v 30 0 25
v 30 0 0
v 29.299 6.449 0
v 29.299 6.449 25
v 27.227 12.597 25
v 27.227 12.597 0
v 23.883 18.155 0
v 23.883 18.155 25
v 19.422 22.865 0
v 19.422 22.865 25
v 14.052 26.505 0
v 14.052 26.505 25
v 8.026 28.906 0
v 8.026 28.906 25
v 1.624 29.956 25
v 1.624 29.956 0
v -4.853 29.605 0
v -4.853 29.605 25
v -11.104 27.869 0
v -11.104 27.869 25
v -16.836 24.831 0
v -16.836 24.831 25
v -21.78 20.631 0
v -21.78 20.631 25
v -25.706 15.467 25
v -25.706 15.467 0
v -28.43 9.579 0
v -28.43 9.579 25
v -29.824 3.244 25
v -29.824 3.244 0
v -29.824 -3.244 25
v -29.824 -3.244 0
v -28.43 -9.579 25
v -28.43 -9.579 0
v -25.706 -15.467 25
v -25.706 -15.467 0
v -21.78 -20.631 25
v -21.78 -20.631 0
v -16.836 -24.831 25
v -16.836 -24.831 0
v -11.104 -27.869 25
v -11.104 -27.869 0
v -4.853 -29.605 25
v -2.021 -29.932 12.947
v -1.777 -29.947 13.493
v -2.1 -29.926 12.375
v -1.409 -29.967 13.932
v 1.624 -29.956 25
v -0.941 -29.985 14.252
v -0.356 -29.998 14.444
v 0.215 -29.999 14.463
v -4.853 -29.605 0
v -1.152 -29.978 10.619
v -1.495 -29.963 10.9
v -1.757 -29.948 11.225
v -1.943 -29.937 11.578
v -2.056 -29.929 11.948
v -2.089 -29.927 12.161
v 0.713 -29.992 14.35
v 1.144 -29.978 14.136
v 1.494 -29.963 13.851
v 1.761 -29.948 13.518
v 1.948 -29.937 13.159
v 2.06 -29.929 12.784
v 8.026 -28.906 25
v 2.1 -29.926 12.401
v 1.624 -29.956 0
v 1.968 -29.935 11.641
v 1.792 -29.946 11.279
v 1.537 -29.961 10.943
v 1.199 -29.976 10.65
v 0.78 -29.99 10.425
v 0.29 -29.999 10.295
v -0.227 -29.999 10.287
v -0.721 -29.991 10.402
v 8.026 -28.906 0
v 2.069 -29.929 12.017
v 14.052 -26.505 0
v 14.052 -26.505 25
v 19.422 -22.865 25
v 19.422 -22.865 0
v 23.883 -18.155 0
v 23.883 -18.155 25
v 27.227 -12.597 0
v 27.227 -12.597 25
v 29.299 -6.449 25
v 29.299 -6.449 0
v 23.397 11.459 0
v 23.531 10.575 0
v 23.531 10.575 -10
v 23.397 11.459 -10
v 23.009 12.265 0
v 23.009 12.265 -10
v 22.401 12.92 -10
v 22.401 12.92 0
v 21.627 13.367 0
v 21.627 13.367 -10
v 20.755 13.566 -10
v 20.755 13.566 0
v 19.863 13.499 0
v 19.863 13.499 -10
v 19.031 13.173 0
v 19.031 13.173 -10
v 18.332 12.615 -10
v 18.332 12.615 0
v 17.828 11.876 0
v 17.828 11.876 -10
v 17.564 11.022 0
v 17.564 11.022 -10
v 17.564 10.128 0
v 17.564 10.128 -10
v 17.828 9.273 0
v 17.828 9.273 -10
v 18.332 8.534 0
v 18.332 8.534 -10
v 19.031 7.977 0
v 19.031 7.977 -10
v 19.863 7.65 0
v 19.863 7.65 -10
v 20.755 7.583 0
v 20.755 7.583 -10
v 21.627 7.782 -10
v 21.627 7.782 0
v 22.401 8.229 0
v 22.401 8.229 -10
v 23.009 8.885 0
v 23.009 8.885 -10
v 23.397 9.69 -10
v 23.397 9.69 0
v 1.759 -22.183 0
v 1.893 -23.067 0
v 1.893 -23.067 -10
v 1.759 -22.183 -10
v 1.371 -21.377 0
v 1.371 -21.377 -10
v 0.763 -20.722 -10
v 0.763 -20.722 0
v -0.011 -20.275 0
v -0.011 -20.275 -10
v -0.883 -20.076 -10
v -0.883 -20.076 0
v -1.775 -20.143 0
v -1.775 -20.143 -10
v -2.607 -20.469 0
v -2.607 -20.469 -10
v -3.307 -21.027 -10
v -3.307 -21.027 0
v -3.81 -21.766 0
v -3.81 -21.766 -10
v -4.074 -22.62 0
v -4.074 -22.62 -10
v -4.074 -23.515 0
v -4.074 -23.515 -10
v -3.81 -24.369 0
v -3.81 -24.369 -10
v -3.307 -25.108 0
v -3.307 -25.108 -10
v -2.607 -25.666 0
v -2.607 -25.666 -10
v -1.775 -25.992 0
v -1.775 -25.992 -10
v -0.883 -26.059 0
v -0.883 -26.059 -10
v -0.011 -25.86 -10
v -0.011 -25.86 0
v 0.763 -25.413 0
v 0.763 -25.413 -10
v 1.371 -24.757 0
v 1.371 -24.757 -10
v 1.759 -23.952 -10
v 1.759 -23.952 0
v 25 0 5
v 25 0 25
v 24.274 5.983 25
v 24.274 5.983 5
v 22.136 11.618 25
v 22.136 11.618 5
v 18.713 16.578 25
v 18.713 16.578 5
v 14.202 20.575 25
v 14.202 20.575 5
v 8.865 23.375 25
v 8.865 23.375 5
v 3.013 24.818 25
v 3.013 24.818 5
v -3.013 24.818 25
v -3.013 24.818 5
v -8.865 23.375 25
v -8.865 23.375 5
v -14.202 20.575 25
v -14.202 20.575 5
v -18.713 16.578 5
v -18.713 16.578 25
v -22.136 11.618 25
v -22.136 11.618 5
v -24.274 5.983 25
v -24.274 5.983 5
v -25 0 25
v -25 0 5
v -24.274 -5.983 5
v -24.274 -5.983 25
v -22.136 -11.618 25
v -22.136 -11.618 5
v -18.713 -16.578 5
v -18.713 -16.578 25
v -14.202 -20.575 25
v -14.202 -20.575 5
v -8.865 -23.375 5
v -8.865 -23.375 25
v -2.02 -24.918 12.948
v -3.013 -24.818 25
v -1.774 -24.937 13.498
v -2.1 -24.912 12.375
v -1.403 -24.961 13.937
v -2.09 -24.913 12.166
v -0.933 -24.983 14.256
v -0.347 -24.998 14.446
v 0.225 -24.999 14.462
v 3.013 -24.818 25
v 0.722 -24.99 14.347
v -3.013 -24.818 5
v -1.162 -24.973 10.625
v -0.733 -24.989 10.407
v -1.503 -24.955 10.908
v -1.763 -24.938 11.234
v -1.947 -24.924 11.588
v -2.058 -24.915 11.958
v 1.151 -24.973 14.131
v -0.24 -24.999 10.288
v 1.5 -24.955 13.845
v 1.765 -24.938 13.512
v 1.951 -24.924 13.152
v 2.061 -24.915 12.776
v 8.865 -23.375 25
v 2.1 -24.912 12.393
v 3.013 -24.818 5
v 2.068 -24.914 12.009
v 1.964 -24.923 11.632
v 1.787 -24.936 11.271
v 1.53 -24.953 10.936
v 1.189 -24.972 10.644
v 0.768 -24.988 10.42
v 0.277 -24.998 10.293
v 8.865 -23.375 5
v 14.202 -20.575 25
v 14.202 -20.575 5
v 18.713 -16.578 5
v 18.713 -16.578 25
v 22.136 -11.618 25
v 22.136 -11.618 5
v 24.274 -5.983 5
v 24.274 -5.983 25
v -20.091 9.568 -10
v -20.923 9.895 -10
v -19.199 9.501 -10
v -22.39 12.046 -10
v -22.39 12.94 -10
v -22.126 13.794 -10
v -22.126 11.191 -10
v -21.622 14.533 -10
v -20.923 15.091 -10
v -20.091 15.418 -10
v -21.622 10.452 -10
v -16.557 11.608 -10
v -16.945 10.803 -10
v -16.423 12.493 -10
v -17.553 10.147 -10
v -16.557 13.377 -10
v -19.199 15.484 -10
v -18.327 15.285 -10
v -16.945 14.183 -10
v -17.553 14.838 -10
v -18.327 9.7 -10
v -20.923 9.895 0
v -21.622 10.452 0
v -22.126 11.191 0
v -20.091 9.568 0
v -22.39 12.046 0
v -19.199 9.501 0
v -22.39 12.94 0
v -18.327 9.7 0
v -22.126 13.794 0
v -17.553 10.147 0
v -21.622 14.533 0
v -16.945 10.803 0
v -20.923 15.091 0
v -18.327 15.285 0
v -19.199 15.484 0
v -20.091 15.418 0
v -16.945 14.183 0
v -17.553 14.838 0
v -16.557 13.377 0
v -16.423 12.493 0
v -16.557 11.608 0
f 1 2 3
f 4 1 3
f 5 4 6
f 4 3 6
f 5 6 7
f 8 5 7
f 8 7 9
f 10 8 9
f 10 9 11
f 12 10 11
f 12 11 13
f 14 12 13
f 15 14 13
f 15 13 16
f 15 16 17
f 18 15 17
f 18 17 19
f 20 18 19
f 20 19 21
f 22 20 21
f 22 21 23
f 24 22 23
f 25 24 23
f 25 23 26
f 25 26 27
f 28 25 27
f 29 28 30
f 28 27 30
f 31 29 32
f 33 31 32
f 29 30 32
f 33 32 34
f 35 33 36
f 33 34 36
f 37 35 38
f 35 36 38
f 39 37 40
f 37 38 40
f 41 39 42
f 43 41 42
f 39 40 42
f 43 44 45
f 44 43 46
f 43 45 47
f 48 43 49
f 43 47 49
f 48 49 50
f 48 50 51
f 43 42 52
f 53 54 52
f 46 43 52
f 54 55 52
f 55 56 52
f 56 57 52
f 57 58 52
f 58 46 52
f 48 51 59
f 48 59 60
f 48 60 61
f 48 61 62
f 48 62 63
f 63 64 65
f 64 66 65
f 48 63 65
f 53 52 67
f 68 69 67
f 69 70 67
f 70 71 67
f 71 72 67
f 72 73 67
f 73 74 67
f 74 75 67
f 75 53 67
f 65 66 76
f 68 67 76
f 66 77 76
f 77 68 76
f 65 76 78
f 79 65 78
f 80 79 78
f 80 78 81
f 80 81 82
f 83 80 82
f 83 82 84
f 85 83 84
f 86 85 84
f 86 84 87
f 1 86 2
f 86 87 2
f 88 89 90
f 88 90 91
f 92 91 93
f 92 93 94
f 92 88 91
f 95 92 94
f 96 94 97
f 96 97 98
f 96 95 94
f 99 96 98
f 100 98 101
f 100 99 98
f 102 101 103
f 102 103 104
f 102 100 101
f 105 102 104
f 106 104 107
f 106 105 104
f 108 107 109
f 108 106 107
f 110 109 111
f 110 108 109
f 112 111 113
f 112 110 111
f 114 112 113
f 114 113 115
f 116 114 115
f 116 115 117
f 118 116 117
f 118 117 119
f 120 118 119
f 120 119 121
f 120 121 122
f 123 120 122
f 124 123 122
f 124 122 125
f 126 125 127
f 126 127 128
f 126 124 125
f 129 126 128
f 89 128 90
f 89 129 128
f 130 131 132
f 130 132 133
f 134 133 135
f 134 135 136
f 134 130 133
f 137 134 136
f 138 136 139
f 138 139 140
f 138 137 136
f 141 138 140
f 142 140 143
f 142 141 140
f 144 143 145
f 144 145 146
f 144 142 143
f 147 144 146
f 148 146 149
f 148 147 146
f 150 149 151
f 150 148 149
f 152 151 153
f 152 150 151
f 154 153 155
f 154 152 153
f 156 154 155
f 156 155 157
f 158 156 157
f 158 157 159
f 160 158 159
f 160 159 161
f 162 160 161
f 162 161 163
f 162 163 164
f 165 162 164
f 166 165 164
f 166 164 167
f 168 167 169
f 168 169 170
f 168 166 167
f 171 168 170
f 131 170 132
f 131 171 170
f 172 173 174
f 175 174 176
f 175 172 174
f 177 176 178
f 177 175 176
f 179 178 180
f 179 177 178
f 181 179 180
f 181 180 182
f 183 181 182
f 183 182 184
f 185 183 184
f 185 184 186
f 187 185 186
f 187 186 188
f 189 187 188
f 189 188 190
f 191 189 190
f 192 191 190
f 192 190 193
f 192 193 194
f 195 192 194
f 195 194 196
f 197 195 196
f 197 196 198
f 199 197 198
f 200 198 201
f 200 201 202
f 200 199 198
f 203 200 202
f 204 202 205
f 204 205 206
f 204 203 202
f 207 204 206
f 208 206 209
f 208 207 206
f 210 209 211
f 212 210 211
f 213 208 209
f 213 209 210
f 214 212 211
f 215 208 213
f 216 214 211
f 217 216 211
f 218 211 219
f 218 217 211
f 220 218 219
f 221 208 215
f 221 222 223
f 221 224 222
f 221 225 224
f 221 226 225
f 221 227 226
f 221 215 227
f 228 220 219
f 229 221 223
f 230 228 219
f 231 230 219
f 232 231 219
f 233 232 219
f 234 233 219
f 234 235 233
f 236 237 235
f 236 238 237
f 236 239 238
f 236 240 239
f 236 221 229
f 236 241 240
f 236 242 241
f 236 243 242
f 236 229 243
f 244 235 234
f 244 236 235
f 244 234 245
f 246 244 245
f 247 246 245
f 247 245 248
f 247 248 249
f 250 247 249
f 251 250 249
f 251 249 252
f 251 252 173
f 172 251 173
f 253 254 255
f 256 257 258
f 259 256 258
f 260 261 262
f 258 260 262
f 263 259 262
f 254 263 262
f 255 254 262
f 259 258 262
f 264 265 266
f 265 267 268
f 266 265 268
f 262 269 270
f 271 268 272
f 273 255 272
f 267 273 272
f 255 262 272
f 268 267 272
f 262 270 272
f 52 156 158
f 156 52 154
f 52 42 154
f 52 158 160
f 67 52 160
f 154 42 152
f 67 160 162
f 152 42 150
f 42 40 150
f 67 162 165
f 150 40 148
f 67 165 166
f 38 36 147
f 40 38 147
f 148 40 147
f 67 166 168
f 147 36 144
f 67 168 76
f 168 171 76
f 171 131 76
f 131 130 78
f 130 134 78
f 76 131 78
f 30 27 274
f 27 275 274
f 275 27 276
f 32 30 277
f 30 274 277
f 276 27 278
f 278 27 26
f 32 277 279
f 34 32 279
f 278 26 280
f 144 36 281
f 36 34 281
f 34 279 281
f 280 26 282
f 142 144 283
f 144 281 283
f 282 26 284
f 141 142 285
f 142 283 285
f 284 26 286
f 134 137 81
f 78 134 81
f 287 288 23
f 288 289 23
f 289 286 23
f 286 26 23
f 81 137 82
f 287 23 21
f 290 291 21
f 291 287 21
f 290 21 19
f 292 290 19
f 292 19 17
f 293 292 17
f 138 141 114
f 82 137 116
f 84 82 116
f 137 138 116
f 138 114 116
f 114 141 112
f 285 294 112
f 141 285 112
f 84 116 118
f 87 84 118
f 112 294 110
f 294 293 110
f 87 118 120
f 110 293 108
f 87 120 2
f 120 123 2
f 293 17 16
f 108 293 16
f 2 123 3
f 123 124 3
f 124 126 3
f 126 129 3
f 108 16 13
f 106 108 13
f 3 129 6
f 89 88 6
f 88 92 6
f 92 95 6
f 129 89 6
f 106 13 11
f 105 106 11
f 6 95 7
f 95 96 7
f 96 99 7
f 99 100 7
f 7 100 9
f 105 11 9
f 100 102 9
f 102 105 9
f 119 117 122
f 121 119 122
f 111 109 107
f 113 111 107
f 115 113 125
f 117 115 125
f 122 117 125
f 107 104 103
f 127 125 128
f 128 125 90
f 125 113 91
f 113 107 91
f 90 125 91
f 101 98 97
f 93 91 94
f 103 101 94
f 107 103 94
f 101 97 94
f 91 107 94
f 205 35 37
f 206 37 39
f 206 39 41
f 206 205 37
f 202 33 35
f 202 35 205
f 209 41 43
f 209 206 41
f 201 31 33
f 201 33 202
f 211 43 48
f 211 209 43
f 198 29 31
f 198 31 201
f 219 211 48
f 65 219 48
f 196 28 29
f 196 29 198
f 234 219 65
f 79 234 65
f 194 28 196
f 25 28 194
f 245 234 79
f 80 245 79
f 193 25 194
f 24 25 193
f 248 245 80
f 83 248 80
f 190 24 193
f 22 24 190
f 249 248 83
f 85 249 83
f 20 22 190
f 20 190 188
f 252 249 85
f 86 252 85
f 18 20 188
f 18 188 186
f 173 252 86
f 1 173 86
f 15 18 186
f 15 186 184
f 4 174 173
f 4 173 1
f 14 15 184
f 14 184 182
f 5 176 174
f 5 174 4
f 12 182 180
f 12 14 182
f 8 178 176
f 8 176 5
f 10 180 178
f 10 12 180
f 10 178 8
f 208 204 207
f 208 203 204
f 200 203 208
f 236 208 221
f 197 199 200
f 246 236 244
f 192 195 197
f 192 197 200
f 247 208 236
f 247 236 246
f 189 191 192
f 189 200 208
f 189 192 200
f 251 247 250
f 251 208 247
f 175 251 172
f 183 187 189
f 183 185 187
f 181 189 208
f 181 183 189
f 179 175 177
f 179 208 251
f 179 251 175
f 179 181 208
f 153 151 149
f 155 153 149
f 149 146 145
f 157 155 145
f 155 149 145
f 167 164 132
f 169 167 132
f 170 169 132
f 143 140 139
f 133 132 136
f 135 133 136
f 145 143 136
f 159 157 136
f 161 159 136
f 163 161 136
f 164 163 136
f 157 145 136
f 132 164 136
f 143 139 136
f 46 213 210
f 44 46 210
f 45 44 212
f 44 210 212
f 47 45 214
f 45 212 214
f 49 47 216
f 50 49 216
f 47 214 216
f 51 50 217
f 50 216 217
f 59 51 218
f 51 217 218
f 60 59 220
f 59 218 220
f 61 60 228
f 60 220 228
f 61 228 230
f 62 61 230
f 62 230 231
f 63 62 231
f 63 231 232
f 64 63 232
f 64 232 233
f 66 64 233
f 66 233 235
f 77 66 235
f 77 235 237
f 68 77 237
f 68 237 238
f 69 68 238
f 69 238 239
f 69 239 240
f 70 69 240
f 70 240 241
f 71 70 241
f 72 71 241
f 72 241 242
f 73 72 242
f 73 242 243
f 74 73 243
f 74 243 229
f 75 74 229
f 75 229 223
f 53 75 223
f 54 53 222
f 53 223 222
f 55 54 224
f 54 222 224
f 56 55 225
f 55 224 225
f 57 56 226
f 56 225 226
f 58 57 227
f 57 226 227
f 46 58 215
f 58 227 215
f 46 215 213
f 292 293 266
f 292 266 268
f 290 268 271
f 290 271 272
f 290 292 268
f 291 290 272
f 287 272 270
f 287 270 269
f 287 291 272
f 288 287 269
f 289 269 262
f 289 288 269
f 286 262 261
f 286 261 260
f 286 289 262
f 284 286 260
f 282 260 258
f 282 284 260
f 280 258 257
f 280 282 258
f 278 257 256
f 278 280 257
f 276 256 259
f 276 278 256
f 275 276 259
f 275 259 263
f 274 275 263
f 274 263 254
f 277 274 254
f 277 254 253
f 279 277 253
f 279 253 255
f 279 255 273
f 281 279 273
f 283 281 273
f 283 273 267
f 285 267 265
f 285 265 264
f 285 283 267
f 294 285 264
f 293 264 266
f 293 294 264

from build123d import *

# Parameters (mm, degrees)
F0_R     = 30
F0_R_2   = 25
F1_DEPTH = 25
F2_R     = 30
F3_DEPTH = 5
F4_R     = 3
F5_DEPTH = 10
F9_D     = 4.2
F9_DEPTH = 12


with BuildPart() as f1:
    # F0 (on Top) → F1 (new body)
    with BuildSketch(Plane.XY):
        Circle(F0_R)
        Circle(F0_R_2, mode=Mode.SUBTRACT)
    extrude(amount=F1_DEPTH)

    # F2 (on Top) → F3 (join)
    with BuildSketch(Plane.XY):
        Circle(F2_R)
    extrude(amount=F3_DEPTH)

    # F4 (on face) → F5 (join)
    with BuildSketch(Plane.XY):
        with Locations((-1.107393, -23.067445)):
            Circle(F4_R)
        with Locations((-19.423297, 12.492753)):
            Circle(F4_R)
        with Locations((20.53069, 10.574692)):
            Circle(F4_R)
    extrude(amount=-F5_DEPTH)

    # F9
    with Locations(Plane.XZ.offset(30)):
        with Locations((0, 12.374512)):
            Hole(F9_D / 2, depth=F9_DEPTH)


solid = f1.part
